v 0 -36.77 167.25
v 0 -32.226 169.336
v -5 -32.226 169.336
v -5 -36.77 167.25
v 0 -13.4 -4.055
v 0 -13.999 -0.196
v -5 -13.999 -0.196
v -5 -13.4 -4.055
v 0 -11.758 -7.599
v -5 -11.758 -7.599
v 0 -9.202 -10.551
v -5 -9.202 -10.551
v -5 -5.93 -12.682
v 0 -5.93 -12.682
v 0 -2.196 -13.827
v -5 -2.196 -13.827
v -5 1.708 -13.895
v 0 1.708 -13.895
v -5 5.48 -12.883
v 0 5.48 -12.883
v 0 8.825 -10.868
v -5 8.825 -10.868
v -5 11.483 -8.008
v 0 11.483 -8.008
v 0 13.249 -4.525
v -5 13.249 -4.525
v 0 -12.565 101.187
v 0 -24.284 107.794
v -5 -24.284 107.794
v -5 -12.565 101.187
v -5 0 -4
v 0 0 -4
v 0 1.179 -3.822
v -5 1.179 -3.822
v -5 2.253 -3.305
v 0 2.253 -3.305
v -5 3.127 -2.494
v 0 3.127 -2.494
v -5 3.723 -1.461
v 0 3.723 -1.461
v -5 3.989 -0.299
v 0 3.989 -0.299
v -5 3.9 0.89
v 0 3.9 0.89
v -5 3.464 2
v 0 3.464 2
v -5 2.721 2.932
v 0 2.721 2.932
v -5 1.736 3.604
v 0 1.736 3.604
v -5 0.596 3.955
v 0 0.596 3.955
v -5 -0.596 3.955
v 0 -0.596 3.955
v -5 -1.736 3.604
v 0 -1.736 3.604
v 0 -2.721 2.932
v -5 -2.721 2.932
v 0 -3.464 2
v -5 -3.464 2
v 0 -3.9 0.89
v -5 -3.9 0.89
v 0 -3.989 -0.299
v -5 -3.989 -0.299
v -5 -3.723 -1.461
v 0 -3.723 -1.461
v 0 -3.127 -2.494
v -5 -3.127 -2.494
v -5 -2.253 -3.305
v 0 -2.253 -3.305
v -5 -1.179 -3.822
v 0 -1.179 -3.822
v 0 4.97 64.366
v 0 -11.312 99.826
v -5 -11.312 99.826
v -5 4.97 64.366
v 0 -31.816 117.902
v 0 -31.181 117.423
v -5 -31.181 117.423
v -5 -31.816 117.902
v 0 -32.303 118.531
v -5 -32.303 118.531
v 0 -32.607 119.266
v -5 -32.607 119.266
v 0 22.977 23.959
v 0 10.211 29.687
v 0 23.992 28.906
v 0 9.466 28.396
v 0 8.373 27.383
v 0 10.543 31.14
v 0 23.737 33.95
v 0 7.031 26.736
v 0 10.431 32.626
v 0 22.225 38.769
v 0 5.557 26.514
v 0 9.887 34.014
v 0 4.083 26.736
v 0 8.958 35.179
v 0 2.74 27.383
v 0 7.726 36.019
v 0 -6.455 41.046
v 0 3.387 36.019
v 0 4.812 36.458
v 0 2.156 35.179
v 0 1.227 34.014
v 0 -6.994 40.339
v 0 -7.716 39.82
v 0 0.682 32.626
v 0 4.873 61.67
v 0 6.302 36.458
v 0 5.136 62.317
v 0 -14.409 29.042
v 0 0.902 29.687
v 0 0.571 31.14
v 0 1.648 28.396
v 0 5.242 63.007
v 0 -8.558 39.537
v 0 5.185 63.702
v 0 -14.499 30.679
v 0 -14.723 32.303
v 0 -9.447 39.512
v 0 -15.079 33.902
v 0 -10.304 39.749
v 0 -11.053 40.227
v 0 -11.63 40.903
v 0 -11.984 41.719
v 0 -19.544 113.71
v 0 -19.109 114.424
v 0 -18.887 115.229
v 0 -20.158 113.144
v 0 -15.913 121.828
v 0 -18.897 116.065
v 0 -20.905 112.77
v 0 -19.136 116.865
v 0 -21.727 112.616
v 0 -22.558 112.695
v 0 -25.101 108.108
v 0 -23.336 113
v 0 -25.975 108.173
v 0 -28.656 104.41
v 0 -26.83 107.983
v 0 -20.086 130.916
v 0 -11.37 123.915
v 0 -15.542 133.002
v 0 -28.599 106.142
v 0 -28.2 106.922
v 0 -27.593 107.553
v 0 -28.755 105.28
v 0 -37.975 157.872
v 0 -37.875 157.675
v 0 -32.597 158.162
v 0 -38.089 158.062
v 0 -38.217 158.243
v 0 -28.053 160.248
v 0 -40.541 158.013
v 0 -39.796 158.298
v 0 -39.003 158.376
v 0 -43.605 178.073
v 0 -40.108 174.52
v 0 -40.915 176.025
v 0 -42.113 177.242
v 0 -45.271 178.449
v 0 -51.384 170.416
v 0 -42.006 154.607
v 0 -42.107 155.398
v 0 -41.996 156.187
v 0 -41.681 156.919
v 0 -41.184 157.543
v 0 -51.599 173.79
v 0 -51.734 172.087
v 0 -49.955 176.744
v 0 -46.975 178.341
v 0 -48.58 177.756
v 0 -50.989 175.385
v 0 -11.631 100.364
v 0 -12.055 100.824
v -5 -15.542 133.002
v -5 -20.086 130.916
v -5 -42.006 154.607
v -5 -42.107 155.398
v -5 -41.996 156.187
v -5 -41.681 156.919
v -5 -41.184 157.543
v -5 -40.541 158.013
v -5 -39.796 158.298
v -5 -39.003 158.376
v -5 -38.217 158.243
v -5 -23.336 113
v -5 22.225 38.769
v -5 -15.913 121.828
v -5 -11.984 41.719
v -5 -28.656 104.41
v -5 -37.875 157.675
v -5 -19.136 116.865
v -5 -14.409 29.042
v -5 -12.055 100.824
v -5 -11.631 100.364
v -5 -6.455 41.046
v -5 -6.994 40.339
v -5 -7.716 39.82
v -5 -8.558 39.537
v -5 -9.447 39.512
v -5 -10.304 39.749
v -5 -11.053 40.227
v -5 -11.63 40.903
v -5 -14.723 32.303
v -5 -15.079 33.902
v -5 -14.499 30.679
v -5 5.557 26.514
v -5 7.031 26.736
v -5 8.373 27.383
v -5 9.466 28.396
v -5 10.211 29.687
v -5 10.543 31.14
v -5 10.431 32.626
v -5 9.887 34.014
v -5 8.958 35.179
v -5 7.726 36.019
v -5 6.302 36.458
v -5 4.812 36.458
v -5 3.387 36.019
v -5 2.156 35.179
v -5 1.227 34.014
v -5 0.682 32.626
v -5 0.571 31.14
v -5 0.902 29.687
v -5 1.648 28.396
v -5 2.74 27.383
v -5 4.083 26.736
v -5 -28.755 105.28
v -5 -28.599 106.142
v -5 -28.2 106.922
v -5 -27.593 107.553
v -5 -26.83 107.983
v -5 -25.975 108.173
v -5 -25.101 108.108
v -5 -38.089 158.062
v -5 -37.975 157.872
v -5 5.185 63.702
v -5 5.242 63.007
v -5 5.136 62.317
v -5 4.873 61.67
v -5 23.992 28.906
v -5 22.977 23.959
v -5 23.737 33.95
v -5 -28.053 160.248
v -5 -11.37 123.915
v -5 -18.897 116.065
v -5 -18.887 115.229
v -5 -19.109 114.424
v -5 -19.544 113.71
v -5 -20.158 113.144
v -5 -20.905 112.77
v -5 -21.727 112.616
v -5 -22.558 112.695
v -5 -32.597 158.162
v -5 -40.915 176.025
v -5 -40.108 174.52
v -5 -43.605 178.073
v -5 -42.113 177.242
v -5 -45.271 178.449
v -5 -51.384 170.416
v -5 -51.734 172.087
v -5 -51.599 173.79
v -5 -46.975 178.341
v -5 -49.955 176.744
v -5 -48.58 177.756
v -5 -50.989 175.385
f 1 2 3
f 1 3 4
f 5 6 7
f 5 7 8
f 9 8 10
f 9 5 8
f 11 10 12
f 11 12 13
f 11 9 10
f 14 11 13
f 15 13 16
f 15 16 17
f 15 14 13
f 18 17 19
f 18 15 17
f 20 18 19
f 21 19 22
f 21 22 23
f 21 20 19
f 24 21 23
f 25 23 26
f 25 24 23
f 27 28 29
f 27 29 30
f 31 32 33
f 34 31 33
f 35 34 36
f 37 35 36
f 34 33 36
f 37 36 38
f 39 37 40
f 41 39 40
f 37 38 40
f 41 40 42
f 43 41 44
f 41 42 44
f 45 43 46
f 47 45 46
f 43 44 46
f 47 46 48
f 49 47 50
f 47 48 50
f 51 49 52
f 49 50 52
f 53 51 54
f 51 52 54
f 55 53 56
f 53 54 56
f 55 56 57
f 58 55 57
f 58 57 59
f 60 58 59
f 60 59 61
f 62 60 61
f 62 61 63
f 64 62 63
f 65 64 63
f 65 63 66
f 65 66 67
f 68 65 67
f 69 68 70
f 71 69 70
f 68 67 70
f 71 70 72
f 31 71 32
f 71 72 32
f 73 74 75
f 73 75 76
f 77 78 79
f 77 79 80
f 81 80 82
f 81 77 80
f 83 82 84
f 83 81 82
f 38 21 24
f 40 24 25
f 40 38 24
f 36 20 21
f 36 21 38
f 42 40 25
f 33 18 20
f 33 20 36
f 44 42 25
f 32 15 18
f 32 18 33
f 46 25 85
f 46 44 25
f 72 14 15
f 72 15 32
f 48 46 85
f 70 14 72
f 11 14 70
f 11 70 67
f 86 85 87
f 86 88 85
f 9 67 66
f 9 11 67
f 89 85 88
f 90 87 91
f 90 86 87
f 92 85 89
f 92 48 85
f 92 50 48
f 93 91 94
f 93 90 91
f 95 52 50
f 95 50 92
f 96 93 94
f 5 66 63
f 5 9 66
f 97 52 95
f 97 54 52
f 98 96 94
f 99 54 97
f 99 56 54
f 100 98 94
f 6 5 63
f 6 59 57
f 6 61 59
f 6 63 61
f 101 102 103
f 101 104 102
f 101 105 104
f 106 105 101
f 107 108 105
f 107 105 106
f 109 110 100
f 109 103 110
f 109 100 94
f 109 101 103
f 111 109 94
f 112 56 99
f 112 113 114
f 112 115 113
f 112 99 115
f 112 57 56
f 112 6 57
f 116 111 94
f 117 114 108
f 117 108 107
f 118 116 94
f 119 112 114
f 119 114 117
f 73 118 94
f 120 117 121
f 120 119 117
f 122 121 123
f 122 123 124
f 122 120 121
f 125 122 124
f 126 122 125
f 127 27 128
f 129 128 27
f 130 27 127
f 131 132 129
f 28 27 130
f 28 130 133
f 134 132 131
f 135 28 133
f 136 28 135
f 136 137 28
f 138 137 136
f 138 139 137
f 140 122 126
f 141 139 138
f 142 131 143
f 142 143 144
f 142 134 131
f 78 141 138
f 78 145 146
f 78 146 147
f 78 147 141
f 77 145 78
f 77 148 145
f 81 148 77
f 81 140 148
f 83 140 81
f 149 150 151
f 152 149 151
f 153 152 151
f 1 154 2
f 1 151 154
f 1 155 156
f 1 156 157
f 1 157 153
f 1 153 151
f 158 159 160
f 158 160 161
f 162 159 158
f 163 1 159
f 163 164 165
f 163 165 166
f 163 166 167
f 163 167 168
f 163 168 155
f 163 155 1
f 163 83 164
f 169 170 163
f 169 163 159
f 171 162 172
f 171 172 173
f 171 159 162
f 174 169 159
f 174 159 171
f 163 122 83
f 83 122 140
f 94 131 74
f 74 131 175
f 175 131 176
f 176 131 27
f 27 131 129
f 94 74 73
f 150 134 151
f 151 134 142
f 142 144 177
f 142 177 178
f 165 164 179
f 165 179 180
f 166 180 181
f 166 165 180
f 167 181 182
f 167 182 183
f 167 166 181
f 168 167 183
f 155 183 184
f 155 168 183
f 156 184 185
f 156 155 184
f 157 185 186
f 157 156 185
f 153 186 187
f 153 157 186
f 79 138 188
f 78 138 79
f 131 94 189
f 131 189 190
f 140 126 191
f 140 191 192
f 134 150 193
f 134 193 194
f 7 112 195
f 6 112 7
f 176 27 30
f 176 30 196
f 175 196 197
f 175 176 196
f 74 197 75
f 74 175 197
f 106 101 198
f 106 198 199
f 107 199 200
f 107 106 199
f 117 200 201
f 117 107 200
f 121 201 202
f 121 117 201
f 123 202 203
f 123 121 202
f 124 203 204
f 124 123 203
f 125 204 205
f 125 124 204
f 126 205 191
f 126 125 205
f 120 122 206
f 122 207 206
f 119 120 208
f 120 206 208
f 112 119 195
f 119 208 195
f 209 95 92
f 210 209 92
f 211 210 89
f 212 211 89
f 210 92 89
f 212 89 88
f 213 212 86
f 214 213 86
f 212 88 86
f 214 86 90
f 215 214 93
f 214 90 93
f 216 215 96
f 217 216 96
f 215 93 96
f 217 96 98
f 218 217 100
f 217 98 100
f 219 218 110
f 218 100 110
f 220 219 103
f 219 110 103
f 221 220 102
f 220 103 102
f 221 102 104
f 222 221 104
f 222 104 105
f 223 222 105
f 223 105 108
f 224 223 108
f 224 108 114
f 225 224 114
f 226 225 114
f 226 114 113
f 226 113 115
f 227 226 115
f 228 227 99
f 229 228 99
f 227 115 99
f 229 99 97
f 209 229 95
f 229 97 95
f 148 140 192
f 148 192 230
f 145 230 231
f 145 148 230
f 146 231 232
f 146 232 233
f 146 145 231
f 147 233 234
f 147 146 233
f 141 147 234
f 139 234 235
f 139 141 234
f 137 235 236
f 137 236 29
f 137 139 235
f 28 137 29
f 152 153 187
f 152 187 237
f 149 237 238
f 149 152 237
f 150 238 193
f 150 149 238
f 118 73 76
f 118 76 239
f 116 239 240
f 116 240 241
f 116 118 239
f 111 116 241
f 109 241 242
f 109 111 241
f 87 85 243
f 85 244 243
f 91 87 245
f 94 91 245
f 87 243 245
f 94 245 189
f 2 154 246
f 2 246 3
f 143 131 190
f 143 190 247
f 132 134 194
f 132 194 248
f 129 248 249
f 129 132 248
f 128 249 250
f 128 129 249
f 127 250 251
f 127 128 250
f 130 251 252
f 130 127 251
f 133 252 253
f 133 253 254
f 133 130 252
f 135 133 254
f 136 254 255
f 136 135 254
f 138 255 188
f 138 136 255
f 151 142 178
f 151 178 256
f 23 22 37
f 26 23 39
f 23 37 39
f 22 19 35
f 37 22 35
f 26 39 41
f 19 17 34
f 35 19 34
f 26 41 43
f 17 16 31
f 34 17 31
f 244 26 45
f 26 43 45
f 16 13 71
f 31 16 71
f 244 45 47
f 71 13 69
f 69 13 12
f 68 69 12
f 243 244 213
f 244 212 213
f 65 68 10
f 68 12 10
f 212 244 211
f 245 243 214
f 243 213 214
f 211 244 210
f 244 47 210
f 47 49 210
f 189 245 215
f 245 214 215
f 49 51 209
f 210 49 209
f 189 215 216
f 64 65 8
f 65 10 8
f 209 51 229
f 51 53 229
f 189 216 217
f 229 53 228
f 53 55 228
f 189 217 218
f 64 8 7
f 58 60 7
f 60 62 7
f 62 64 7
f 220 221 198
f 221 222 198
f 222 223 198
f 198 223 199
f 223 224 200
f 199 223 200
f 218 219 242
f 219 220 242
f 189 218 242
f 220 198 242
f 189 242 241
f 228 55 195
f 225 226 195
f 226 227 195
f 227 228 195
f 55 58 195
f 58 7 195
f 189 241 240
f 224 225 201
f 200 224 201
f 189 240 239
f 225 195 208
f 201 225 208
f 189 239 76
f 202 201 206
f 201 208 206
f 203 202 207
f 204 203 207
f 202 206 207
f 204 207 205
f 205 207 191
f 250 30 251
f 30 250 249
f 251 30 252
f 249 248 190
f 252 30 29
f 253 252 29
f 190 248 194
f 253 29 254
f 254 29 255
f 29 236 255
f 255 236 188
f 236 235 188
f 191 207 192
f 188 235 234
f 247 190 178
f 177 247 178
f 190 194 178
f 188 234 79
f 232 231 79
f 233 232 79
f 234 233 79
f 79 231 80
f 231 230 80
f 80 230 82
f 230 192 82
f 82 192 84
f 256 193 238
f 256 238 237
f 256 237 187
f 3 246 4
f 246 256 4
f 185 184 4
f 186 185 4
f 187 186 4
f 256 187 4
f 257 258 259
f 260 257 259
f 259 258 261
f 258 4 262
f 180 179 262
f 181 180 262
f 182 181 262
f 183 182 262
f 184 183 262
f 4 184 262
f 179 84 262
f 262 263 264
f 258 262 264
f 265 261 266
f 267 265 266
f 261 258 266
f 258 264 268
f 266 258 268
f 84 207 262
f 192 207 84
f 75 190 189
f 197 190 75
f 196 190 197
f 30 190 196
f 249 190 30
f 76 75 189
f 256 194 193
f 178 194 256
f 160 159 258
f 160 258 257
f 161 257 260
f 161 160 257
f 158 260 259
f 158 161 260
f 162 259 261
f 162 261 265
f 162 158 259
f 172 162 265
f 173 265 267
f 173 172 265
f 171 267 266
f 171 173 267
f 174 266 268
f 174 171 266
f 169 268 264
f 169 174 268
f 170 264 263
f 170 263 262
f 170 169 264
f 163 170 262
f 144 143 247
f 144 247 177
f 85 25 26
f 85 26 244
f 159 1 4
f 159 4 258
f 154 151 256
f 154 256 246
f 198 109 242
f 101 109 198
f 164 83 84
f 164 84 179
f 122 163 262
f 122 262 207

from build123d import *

# Parameters (mm, degrees)
SKETCH1_R           = 4
SKETCH1_R_2         = 5
BOSS_EXTRUDE1_DEPTH = 5
FILLET3_R           = 20
FILLET10_R          = 3


with BuildPart() as part:
    # Sketch1 → Boss-Extrude1 (new body)
    # profile 1 of 3: a face of its own
    with BuildSketch(Plane.YZ):
        with BuildLine():
            Line((-14.443258315, 31.513848096), (-13.998623919, -0.196286448))
            ThreePointArc((-13.998623919, -0.196286448), (-2.196477435, -13.826622396), (13.248647006, -4.52474889))
            Line((13.248647006, -4.52474889), (25.556741685, 31.513848096))
            Line((25.556741685, 31.513848096), (-15.913444308, 121.828294459))
            Line((-15.913444308, 121.828294459), (-17.991906384, 126.354803013))
            Line((-17.991906384, 126.354803013), (-20.086315573, 130.916041451))
            Line((-20.086315573, 130.916041451), (-32.596955812, 158.161917487))
            Line((-32.596955812, 158.161917487), (-34.683391444, 162.705790984))
            Line((-34.683391444, 162.705790984), (-36.769827077, 167.24966448))
            Line((-36.769827077, 167.24966448), (-40.108124089, 174.519862074))
            ThreePointArc((-40.108124089, 174.519862074), (-47.798400673, 178.105896939), (-51.384435538, 170.415620354))
            Line((-51.384435538, 170.415620354), (-14.443258315, 31.513848096))
        make_face()
        with Locations(Location((0, 0, 0), (0, 0, 270))):
            Circle(SKETCH1_R, mode=Mode.SUBTRACT)
        with Locations(Location((5.556741685, 31.513848096, 0), (0, 0, 270))):
            Circle(SKETCH1_R_2, mode=Mode.SUBTRACT)
        Polygon((-10.059219018, 34.483430451), (-30.486505123, 111.291655193), (-11.718080145, 100.709404741), (5.599975549, 62.99386104), align=None, mode=Mode.SUBTRACT)
        Polygon((-38.215011053, 158.414852351), (-15.274502195, 108.454638594), (-32.282363467, 118.044225778), (-44.116299331, 162.540768328), align=None, mode=Mode.SUBTRACT)
    # profile 2 of 3: a face of its own
    with BuildSketch(Plane.YZ):
        Polygon((-17.991906384, 126.354803013), (-15.913444308, 121.828294459), (-11.369603993, 123.914714855), (-15.542475258, 133.002461848), (-20.086315573, 130.916041451), align=None)
    # profile 3 of 3: a face of its own
    with BuildSketch(Plane.YZ):
        Polygon((-32.22595358, 169.336100113), (-36.769827077, 167.24966448), (-34.683391444, 162.705790984), (-32.596955812, 158.161917487), (-28.053082315, 160.24835312), align=None)
    extrude(amount=-BOSS_EXTRUDE1_DEPTH)

    # Fillet3
    fillet3_edges = [part.edges().sort_by_distance(p)[0] for p in [
        (-2.5, 25.556741685, 31.513848096),
        (-2.5, -14.443258315, 31.513848096),
    ]]
    fillet(fillet3_edges, radius=FILLET3_R)

    # Fillet10
    # the kernel refuses this fillet: 3 mm, written as the material it adds along each edge
    with BuildSketch(Plane(origin=(0, -38.215011053, 158.414852351), x_dir=(0, 0.41728712651347166, -0.9087746992770703), z_dir=(-1, 0, 0))) as fillet10_piece_1:
        with BuildLine():
            CenterArc((FILLET10_R * 0.271478941521, FILLET10_R), FILLET10_R, 239.62294962, 30.37705038)
            Line((-FILLET10_R * 0.23420930525, FILLET10_R * 0.137283709973), (0, 0))
            Line((0, 0), (FILLET10_R * 0.271478941521, 0))
        make_face()
    extrude(amount=5)
    with BuildSketch(Plane(origin=(0, -32.282363467, 118.044225778), x_dir=(0, 0.8710790696902164, -0.49114280443433855), z_dir=(-1, 0, 0))) as fillet10_piece_2:
        with BuildLine():
            CenterArc((FILLET10_R * 0.421297147858, -FILLET10_R), FILLET10_R, 90, 45.691106369)
            Line((-FILLET10_R * 0.294287167004, -FILLET10_R * 0.301473630904), (0, 0))
            Line((0, 0), (FILLET10_R * 0.421297147858, 0))
        make_face()
    extrude(amount=5)
    with BuildSketch(Plane(origin=(0, -30.486505123, 111.291655193), x_dir=(0, 0.25701761253564515, -0.9664067191645953), z_dir=(-1, 0, 0))) as fillet10_piece_3:
        with BuildLine():
            CenterArc((FILLET10_R * 2.37362157585, -FILLET10_R), FILLET10_R, 90, 134.308893631)
            Line((FILLET10_R * 1.65803726099, -FILLET10_R * 1.6985263691), (0, 0))
            Line((0, 0), (FILLET10_R * 2.37362157585, 0))
        make_face()
    extrude(amount=5)
    with BuildSketch(Plane(origin=(0, -11.718080145, 100.709404741), x_dir=(0, -0.8710790696902125, 0.4911428044343457), z_dir=(-1, 0, 0))) as fillet10_piece_4:
        with BuildLine():
            CenterArc((FILLET10_R * 0.324156203472, -FILLET10_R), FILLET10_R, 90, 35.920846961)
            Line((-FILLET10_R * 0.262510846562, -FILLET10_R * 0.190171763641), (0, 0))
            Line((0, 0), (FILLET10_R * 0.324156203472, 0))
        make_face()
    extrude(amount=5)
    with BuildSketch(Plane(origin=(0, -10.059219018, 34.483430451), x_dir=(0, -0.2570176125356449, 0.9664067191645953), z_dir=(-1, 0, 0))) as fillet10_piece_5:
        with BuildLine():
            CenterArc((FILLET10_R * 2.49571060233, FILLET10_R), FILLET10_R, 133.670716463, 136.329283537)
            Line((FILLET10_R * 1.80519778573, FILLET10_R * 1.72332015741), (0, 0))
            Line((0, 0), (FILLET10_R * 2.49571060233, 0))
        make_face()
    extrude(amount=5)
    with BuildSketch(Plane(origin=(0, 5.599975549, 62.99386104), x_dir=(0, -0.41728712651347205, 0.9087746992770702), z_dir=(-1, 0, 0))) as fillet10_piece_6:
        with BuildLine():
            CenterArc((FILLET10_R * 0.503395718442, -FILLET10_R), FILLET10_R, 90, 53.440975871)
            Line((-FILLET10_R * 0.299847949894, -FILLET10_R * 0.404349423506), (0, 0))
            Line((0, 0), (FILLET10_R * 0.503395718442, 0))
        make_face()
    extrude(amount=5)
    with BuildSketch(Plane(origin=(0, -15.274502195, 108.454638594), x_dir=(0, -0.4172871265134709, 0.9087746992770708), z_dir=(-1, 0, 0))) as fillet10_piece_7:
        with BuildLine():
            CenterArc((FILLET10_R * 3.08493247789, -FILLET10_R), FILLET10_R, 90, 144.079153039)
            Line((FILLET10_R * 2.49826542786, -FILLET10_R * 1.80982823636), (0, 0))
            Line((0, 0), (FILLET10_R * 3.08493247789, 0))
        make_face()
    extrude(amount=5)
    with BuildSketch(Plane(origin=(0, -44.116299331, 162.540768328), x_dir=(0, 0.2570176125356455, -0.9664067191645951), z_dir=(-1, 0, 0))) as fillet10_piece_8:
        with BuildLine():
            CenterArc((FILLET10_R * 2.73652664972, -FILLET10_R), FILLET10_R, 90, 139.852690212)
            Line((FILLET10_R * 2.09177163516, -FILLET10_R * 1.76438927988), (0, 0))
            Line((0, 0), (FILLET10_R * 2.73652664972, 0))
        make_face()
    extrude(amount=5)


solid = part.part
